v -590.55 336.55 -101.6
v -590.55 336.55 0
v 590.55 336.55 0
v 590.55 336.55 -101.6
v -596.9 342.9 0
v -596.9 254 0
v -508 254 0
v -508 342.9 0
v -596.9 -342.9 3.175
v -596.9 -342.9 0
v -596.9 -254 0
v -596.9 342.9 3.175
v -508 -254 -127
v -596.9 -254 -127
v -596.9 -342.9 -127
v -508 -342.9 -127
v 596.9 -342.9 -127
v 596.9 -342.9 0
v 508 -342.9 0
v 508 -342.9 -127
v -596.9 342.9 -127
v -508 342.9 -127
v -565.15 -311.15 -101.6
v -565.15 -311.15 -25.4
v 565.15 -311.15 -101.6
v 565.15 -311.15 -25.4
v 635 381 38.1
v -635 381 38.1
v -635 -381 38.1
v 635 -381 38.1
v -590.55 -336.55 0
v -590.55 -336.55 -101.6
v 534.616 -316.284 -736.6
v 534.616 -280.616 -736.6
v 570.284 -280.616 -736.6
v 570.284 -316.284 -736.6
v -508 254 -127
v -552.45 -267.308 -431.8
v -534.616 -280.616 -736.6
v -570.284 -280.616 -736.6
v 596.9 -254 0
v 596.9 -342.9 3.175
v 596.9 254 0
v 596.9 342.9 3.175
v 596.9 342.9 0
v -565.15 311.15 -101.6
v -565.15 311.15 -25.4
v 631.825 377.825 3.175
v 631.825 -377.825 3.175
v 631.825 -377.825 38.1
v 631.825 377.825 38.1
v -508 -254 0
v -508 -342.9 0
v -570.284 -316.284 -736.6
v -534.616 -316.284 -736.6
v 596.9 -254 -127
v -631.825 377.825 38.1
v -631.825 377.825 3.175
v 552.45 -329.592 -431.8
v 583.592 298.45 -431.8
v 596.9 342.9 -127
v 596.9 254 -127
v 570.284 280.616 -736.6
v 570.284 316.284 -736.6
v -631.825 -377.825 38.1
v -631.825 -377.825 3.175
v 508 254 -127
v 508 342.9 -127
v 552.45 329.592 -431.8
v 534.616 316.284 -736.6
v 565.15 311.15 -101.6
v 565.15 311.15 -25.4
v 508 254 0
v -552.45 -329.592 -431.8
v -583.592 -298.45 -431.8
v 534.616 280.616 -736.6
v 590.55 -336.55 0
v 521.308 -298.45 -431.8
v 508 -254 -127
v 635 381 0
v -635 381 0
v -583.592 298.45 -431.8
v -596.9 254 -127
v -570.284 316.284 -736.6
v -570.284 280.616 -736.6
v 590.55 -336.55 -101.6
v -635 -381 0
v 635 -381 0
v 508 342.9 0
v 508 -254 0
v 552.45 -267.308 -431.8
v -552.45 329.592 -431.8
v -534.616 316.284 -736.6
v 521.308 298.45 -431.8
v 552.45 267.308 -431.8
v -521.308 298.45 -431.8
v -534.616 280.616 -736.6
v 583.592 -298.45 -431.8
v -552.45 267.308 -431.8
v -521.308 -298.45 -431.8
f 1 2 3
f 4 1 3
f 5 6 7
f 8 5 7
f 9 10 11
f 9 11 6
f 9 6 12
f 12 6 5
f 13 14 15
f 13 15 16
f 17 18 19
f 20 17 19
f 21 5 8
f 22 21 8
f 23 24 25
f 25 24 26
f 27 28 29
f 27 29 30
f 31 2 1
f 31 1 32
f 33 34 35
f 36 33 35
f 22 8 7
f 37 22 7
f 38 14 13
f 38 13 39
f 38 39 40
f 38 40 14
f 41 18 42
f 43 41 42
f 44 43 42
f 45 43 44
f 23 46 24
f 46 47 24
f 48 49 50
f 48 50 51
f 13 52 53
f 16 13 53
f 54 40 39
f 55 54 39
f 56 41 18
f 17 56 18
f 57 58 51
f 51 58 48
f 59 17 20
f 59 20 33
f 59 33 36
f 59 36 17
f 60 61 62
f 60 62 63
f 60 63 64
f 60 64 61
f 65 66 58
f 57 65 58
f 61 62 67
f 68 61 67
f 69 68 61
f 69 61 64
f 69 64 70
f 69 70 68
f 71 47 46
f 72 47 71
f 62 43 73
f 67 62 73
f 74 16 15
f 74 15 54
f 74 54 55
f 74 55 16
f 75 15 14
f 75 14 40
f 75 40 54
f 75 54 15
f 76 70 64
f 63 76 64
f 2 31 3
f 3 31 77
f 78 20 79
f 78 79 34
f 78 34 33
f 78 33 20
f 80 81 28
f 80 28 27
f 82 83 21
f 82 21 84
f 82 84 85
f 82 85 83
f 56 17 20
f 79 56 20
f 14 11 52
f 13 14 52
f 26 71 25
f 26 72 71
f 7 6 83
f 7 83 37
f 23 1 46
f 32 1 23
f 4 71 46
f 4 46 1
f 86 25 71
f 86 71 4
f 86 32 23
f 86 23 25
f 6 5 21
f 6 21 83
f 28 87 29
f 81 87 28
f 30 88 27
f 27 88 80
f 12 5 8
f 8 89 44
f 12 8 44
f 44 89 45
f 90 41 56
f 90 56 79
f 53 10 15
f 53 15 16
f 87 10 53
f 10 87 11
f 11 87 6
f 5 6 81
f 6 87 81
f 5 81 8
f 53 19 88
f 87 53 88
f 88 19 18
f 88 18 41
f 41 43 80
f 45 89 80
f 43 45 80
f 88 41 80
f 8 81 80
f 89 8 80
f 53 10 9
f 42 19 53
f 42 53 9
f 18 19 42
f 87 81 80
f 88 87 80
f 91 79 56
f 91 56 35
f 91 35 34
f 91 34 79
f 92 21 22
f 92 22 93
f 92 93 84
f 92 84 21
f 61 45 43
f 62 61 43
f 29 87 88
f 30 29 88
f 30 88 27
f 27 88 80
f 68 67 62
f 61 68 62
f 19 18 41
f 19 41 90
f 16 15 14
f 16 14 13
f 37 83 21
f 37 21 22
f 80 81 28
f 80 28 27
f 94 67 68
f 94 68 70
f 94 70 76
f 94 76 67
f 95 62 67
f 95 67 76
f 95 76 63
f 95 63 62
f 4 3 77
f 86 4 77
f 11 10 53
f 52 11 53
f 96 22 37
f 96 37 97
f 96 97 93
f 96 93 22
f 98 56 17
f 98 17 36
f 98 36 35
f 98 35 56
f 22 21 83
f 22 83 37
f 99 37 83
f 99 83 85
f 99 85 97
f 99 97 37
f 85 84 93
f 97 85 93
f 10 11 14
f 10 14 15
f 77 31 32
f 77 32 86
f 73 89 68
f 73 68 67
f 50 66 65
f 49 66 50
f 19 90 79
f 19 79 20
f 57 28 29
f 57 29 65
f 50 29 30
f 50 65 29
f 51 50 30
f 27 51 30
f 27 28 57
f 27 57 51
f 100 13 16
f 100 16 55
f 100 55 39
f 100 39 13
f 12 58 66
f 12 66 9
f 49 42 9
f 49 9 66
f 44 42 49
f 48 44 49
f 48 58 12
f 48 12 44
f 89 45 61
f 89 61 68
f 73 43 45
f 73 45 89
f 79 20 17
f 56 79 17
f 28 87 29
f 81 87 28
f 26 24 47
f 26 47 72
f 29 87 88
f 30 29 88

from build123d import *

# Parameters (mm, degrees)
F0_W      = 1270
F0_H      = 762
F0_W_2    = 1263.65
F0_H_2    = 755.65
F1_DEPTH  = 38.1
F3_W      = 88.9
F3_H      = 88.9
F4_DEPTH  = 127
F6_W      = 1181.1
F6_H      = 673.1
F7_DEPTH  = 101.6
F8_T      = -25.4
F9_W      = 1270
F9_H      = 762
F9_W_2    = 1193.8
F9_H_2    = 685.8
F10_DEPTH = 3.175
F11_W     = 1270
F11_H     = 762
F12_DEPTH = 38.1
F13_W     = 88.9
F13_H     = 88.9
F14_DEPTH = 609.6
F14_TAPER = 2.5


with BuildPart() as f1:
    # F0 (on Top) → F1 (new body)
    with BuildSketch(Plane.XY):
        Rectangle(F0_W, F0_H)
        Rectangle(F0_W_2, F0_H_2, mode=Mode.SUBTRACT)
    extrude(amount=F1_DEPTH)



with BuildPart() as f4:
    # F3 (on face) → F4 (new body)
    with BuildSketch(Plane(origin=(0, 0, 0), x_dir=(1, 0, 0), z_dir=(0, 0, -1))):
        with Locations((-552.45, 298.45)):
            Rectangle(F3_W, F3_H)
    extrude(amount=F4_DEPTH)


with BuildPart() as f4b:
    # F3 (on face) → F4, piece 2 (new body)
    with BuildSketch(Plane(origin=(0, 0, 0), x_dir=(1, 0, 0), z_dir=(0, 0, -1))):
        with Locations((-552.45, -298.45)):
            Rectangle(F3_W, F3_H)
    extrude(amount=F4_DEPTH)


with BuildPart() as f5_1:
    # F5: instance of F4
    add(f4.part.mirror(Plane.YZ))


with BuildPart() as f5_2:
    # F5: instance of F4b
    add(f4b.part.mirror(Plane.YZ))


with BuildPart() as f7:
    # F6 (on face) → F7 (new body)
    with BuildSketch(Plane(origin=(0, 0, 0), x_dir=(1, 0, 0), z_dir=(0, 0, -1))):
        Rectangle(F6_W, F6_H)
    extrude(amount=F7_DEPTH)

    # F8
    f8_openings = [f7.faces().sort_by_distance(p)[0] for p in [
        (0, 0, -101.6),
    ]]
    offset(amount=F8_T, openings=f8_openings)


with BuildPart() as f1_1:
    add(f1.part)

    add(f4.part)  # F10 merges F4

    add(f4b.part)  # F10 merges F4b

    add(f5_1.part)  # F10 merges F5_1

    add(f5_2.part)  # F10 merges F5_2
    # F9 (on Top) → F10 (join)
    with BuildSketch(Plane.XY):
        Rectangle(F9_W, F9_H)
        Rectangle(F9_W_2, F9_H_2, mode=Mode.SUBTRACT)
    extrude(amount=F10_DEPTH)


with BuildPart() as f12:
    # F11 (on Top) → F12 (new body)
    with BuildSketch(Plane.XY):
        Rectangle(F11_W, F11_H)
    extrude(amount=F12_DEPTH)


with BuildPart() as f14:
    # F13 (on face) → F14 (new body)
    with BuildSketch(Plane(origin=(0, 0, -127), x_dir=(1, 0, 0), z_dir=(0, 0, -1))):
        with Locations((-552.45, 298.45)):
            Rectangle(F13_W, F13_H)
    extrude(amount=F14_DEPTH, taper=F14_TAPER)


with BuildPart() as f14b:
    # F13 (on face) → F14, piece 2 (new body)
    with BuildSketch(Plane(origin=(0, 0, -127), x_dir=(1, 0, 0), z_dir=(0, 0, -1))):
        with Locations((552.45, 298.45)):
            Rectangle(F13_W, F13_H)
    extrude(amount=F14_DEPTH, taper=F14_TAPER)


with BuildPart() as f14c:
    # F13 (on face) → F14, piece 3 (new body)
    with BuildSketch(Plane(origin=(0, 0, -127), x_dir=(1, 0, 0), z_dir=(0, 0, -1))):
        with Locations((552.45, -298.45)):
            Rectangle(F13_W, F13_H)
    extrude(amount=F14_DEPTH, taper=F14_TAPER)


with BuildPart() as f14d:
    # F13 (on face) → F14, piece 4 (new body)
    with BuildSketch(Plane(origin=(0, 0, -127), x_dir=(1, 0, 0), z_dir=(0, 0, -1))):
        with Locations((-552.45, -298.45)):
            Rectangle(F13_W, F13_H)
    extrude(amount=F14_DEPTH, taper=F14_TAPER)


solid = Compound([f7.part, f1_1.part, f12.part, f14.part, f14b.part, f14c.part, f14d.part])
